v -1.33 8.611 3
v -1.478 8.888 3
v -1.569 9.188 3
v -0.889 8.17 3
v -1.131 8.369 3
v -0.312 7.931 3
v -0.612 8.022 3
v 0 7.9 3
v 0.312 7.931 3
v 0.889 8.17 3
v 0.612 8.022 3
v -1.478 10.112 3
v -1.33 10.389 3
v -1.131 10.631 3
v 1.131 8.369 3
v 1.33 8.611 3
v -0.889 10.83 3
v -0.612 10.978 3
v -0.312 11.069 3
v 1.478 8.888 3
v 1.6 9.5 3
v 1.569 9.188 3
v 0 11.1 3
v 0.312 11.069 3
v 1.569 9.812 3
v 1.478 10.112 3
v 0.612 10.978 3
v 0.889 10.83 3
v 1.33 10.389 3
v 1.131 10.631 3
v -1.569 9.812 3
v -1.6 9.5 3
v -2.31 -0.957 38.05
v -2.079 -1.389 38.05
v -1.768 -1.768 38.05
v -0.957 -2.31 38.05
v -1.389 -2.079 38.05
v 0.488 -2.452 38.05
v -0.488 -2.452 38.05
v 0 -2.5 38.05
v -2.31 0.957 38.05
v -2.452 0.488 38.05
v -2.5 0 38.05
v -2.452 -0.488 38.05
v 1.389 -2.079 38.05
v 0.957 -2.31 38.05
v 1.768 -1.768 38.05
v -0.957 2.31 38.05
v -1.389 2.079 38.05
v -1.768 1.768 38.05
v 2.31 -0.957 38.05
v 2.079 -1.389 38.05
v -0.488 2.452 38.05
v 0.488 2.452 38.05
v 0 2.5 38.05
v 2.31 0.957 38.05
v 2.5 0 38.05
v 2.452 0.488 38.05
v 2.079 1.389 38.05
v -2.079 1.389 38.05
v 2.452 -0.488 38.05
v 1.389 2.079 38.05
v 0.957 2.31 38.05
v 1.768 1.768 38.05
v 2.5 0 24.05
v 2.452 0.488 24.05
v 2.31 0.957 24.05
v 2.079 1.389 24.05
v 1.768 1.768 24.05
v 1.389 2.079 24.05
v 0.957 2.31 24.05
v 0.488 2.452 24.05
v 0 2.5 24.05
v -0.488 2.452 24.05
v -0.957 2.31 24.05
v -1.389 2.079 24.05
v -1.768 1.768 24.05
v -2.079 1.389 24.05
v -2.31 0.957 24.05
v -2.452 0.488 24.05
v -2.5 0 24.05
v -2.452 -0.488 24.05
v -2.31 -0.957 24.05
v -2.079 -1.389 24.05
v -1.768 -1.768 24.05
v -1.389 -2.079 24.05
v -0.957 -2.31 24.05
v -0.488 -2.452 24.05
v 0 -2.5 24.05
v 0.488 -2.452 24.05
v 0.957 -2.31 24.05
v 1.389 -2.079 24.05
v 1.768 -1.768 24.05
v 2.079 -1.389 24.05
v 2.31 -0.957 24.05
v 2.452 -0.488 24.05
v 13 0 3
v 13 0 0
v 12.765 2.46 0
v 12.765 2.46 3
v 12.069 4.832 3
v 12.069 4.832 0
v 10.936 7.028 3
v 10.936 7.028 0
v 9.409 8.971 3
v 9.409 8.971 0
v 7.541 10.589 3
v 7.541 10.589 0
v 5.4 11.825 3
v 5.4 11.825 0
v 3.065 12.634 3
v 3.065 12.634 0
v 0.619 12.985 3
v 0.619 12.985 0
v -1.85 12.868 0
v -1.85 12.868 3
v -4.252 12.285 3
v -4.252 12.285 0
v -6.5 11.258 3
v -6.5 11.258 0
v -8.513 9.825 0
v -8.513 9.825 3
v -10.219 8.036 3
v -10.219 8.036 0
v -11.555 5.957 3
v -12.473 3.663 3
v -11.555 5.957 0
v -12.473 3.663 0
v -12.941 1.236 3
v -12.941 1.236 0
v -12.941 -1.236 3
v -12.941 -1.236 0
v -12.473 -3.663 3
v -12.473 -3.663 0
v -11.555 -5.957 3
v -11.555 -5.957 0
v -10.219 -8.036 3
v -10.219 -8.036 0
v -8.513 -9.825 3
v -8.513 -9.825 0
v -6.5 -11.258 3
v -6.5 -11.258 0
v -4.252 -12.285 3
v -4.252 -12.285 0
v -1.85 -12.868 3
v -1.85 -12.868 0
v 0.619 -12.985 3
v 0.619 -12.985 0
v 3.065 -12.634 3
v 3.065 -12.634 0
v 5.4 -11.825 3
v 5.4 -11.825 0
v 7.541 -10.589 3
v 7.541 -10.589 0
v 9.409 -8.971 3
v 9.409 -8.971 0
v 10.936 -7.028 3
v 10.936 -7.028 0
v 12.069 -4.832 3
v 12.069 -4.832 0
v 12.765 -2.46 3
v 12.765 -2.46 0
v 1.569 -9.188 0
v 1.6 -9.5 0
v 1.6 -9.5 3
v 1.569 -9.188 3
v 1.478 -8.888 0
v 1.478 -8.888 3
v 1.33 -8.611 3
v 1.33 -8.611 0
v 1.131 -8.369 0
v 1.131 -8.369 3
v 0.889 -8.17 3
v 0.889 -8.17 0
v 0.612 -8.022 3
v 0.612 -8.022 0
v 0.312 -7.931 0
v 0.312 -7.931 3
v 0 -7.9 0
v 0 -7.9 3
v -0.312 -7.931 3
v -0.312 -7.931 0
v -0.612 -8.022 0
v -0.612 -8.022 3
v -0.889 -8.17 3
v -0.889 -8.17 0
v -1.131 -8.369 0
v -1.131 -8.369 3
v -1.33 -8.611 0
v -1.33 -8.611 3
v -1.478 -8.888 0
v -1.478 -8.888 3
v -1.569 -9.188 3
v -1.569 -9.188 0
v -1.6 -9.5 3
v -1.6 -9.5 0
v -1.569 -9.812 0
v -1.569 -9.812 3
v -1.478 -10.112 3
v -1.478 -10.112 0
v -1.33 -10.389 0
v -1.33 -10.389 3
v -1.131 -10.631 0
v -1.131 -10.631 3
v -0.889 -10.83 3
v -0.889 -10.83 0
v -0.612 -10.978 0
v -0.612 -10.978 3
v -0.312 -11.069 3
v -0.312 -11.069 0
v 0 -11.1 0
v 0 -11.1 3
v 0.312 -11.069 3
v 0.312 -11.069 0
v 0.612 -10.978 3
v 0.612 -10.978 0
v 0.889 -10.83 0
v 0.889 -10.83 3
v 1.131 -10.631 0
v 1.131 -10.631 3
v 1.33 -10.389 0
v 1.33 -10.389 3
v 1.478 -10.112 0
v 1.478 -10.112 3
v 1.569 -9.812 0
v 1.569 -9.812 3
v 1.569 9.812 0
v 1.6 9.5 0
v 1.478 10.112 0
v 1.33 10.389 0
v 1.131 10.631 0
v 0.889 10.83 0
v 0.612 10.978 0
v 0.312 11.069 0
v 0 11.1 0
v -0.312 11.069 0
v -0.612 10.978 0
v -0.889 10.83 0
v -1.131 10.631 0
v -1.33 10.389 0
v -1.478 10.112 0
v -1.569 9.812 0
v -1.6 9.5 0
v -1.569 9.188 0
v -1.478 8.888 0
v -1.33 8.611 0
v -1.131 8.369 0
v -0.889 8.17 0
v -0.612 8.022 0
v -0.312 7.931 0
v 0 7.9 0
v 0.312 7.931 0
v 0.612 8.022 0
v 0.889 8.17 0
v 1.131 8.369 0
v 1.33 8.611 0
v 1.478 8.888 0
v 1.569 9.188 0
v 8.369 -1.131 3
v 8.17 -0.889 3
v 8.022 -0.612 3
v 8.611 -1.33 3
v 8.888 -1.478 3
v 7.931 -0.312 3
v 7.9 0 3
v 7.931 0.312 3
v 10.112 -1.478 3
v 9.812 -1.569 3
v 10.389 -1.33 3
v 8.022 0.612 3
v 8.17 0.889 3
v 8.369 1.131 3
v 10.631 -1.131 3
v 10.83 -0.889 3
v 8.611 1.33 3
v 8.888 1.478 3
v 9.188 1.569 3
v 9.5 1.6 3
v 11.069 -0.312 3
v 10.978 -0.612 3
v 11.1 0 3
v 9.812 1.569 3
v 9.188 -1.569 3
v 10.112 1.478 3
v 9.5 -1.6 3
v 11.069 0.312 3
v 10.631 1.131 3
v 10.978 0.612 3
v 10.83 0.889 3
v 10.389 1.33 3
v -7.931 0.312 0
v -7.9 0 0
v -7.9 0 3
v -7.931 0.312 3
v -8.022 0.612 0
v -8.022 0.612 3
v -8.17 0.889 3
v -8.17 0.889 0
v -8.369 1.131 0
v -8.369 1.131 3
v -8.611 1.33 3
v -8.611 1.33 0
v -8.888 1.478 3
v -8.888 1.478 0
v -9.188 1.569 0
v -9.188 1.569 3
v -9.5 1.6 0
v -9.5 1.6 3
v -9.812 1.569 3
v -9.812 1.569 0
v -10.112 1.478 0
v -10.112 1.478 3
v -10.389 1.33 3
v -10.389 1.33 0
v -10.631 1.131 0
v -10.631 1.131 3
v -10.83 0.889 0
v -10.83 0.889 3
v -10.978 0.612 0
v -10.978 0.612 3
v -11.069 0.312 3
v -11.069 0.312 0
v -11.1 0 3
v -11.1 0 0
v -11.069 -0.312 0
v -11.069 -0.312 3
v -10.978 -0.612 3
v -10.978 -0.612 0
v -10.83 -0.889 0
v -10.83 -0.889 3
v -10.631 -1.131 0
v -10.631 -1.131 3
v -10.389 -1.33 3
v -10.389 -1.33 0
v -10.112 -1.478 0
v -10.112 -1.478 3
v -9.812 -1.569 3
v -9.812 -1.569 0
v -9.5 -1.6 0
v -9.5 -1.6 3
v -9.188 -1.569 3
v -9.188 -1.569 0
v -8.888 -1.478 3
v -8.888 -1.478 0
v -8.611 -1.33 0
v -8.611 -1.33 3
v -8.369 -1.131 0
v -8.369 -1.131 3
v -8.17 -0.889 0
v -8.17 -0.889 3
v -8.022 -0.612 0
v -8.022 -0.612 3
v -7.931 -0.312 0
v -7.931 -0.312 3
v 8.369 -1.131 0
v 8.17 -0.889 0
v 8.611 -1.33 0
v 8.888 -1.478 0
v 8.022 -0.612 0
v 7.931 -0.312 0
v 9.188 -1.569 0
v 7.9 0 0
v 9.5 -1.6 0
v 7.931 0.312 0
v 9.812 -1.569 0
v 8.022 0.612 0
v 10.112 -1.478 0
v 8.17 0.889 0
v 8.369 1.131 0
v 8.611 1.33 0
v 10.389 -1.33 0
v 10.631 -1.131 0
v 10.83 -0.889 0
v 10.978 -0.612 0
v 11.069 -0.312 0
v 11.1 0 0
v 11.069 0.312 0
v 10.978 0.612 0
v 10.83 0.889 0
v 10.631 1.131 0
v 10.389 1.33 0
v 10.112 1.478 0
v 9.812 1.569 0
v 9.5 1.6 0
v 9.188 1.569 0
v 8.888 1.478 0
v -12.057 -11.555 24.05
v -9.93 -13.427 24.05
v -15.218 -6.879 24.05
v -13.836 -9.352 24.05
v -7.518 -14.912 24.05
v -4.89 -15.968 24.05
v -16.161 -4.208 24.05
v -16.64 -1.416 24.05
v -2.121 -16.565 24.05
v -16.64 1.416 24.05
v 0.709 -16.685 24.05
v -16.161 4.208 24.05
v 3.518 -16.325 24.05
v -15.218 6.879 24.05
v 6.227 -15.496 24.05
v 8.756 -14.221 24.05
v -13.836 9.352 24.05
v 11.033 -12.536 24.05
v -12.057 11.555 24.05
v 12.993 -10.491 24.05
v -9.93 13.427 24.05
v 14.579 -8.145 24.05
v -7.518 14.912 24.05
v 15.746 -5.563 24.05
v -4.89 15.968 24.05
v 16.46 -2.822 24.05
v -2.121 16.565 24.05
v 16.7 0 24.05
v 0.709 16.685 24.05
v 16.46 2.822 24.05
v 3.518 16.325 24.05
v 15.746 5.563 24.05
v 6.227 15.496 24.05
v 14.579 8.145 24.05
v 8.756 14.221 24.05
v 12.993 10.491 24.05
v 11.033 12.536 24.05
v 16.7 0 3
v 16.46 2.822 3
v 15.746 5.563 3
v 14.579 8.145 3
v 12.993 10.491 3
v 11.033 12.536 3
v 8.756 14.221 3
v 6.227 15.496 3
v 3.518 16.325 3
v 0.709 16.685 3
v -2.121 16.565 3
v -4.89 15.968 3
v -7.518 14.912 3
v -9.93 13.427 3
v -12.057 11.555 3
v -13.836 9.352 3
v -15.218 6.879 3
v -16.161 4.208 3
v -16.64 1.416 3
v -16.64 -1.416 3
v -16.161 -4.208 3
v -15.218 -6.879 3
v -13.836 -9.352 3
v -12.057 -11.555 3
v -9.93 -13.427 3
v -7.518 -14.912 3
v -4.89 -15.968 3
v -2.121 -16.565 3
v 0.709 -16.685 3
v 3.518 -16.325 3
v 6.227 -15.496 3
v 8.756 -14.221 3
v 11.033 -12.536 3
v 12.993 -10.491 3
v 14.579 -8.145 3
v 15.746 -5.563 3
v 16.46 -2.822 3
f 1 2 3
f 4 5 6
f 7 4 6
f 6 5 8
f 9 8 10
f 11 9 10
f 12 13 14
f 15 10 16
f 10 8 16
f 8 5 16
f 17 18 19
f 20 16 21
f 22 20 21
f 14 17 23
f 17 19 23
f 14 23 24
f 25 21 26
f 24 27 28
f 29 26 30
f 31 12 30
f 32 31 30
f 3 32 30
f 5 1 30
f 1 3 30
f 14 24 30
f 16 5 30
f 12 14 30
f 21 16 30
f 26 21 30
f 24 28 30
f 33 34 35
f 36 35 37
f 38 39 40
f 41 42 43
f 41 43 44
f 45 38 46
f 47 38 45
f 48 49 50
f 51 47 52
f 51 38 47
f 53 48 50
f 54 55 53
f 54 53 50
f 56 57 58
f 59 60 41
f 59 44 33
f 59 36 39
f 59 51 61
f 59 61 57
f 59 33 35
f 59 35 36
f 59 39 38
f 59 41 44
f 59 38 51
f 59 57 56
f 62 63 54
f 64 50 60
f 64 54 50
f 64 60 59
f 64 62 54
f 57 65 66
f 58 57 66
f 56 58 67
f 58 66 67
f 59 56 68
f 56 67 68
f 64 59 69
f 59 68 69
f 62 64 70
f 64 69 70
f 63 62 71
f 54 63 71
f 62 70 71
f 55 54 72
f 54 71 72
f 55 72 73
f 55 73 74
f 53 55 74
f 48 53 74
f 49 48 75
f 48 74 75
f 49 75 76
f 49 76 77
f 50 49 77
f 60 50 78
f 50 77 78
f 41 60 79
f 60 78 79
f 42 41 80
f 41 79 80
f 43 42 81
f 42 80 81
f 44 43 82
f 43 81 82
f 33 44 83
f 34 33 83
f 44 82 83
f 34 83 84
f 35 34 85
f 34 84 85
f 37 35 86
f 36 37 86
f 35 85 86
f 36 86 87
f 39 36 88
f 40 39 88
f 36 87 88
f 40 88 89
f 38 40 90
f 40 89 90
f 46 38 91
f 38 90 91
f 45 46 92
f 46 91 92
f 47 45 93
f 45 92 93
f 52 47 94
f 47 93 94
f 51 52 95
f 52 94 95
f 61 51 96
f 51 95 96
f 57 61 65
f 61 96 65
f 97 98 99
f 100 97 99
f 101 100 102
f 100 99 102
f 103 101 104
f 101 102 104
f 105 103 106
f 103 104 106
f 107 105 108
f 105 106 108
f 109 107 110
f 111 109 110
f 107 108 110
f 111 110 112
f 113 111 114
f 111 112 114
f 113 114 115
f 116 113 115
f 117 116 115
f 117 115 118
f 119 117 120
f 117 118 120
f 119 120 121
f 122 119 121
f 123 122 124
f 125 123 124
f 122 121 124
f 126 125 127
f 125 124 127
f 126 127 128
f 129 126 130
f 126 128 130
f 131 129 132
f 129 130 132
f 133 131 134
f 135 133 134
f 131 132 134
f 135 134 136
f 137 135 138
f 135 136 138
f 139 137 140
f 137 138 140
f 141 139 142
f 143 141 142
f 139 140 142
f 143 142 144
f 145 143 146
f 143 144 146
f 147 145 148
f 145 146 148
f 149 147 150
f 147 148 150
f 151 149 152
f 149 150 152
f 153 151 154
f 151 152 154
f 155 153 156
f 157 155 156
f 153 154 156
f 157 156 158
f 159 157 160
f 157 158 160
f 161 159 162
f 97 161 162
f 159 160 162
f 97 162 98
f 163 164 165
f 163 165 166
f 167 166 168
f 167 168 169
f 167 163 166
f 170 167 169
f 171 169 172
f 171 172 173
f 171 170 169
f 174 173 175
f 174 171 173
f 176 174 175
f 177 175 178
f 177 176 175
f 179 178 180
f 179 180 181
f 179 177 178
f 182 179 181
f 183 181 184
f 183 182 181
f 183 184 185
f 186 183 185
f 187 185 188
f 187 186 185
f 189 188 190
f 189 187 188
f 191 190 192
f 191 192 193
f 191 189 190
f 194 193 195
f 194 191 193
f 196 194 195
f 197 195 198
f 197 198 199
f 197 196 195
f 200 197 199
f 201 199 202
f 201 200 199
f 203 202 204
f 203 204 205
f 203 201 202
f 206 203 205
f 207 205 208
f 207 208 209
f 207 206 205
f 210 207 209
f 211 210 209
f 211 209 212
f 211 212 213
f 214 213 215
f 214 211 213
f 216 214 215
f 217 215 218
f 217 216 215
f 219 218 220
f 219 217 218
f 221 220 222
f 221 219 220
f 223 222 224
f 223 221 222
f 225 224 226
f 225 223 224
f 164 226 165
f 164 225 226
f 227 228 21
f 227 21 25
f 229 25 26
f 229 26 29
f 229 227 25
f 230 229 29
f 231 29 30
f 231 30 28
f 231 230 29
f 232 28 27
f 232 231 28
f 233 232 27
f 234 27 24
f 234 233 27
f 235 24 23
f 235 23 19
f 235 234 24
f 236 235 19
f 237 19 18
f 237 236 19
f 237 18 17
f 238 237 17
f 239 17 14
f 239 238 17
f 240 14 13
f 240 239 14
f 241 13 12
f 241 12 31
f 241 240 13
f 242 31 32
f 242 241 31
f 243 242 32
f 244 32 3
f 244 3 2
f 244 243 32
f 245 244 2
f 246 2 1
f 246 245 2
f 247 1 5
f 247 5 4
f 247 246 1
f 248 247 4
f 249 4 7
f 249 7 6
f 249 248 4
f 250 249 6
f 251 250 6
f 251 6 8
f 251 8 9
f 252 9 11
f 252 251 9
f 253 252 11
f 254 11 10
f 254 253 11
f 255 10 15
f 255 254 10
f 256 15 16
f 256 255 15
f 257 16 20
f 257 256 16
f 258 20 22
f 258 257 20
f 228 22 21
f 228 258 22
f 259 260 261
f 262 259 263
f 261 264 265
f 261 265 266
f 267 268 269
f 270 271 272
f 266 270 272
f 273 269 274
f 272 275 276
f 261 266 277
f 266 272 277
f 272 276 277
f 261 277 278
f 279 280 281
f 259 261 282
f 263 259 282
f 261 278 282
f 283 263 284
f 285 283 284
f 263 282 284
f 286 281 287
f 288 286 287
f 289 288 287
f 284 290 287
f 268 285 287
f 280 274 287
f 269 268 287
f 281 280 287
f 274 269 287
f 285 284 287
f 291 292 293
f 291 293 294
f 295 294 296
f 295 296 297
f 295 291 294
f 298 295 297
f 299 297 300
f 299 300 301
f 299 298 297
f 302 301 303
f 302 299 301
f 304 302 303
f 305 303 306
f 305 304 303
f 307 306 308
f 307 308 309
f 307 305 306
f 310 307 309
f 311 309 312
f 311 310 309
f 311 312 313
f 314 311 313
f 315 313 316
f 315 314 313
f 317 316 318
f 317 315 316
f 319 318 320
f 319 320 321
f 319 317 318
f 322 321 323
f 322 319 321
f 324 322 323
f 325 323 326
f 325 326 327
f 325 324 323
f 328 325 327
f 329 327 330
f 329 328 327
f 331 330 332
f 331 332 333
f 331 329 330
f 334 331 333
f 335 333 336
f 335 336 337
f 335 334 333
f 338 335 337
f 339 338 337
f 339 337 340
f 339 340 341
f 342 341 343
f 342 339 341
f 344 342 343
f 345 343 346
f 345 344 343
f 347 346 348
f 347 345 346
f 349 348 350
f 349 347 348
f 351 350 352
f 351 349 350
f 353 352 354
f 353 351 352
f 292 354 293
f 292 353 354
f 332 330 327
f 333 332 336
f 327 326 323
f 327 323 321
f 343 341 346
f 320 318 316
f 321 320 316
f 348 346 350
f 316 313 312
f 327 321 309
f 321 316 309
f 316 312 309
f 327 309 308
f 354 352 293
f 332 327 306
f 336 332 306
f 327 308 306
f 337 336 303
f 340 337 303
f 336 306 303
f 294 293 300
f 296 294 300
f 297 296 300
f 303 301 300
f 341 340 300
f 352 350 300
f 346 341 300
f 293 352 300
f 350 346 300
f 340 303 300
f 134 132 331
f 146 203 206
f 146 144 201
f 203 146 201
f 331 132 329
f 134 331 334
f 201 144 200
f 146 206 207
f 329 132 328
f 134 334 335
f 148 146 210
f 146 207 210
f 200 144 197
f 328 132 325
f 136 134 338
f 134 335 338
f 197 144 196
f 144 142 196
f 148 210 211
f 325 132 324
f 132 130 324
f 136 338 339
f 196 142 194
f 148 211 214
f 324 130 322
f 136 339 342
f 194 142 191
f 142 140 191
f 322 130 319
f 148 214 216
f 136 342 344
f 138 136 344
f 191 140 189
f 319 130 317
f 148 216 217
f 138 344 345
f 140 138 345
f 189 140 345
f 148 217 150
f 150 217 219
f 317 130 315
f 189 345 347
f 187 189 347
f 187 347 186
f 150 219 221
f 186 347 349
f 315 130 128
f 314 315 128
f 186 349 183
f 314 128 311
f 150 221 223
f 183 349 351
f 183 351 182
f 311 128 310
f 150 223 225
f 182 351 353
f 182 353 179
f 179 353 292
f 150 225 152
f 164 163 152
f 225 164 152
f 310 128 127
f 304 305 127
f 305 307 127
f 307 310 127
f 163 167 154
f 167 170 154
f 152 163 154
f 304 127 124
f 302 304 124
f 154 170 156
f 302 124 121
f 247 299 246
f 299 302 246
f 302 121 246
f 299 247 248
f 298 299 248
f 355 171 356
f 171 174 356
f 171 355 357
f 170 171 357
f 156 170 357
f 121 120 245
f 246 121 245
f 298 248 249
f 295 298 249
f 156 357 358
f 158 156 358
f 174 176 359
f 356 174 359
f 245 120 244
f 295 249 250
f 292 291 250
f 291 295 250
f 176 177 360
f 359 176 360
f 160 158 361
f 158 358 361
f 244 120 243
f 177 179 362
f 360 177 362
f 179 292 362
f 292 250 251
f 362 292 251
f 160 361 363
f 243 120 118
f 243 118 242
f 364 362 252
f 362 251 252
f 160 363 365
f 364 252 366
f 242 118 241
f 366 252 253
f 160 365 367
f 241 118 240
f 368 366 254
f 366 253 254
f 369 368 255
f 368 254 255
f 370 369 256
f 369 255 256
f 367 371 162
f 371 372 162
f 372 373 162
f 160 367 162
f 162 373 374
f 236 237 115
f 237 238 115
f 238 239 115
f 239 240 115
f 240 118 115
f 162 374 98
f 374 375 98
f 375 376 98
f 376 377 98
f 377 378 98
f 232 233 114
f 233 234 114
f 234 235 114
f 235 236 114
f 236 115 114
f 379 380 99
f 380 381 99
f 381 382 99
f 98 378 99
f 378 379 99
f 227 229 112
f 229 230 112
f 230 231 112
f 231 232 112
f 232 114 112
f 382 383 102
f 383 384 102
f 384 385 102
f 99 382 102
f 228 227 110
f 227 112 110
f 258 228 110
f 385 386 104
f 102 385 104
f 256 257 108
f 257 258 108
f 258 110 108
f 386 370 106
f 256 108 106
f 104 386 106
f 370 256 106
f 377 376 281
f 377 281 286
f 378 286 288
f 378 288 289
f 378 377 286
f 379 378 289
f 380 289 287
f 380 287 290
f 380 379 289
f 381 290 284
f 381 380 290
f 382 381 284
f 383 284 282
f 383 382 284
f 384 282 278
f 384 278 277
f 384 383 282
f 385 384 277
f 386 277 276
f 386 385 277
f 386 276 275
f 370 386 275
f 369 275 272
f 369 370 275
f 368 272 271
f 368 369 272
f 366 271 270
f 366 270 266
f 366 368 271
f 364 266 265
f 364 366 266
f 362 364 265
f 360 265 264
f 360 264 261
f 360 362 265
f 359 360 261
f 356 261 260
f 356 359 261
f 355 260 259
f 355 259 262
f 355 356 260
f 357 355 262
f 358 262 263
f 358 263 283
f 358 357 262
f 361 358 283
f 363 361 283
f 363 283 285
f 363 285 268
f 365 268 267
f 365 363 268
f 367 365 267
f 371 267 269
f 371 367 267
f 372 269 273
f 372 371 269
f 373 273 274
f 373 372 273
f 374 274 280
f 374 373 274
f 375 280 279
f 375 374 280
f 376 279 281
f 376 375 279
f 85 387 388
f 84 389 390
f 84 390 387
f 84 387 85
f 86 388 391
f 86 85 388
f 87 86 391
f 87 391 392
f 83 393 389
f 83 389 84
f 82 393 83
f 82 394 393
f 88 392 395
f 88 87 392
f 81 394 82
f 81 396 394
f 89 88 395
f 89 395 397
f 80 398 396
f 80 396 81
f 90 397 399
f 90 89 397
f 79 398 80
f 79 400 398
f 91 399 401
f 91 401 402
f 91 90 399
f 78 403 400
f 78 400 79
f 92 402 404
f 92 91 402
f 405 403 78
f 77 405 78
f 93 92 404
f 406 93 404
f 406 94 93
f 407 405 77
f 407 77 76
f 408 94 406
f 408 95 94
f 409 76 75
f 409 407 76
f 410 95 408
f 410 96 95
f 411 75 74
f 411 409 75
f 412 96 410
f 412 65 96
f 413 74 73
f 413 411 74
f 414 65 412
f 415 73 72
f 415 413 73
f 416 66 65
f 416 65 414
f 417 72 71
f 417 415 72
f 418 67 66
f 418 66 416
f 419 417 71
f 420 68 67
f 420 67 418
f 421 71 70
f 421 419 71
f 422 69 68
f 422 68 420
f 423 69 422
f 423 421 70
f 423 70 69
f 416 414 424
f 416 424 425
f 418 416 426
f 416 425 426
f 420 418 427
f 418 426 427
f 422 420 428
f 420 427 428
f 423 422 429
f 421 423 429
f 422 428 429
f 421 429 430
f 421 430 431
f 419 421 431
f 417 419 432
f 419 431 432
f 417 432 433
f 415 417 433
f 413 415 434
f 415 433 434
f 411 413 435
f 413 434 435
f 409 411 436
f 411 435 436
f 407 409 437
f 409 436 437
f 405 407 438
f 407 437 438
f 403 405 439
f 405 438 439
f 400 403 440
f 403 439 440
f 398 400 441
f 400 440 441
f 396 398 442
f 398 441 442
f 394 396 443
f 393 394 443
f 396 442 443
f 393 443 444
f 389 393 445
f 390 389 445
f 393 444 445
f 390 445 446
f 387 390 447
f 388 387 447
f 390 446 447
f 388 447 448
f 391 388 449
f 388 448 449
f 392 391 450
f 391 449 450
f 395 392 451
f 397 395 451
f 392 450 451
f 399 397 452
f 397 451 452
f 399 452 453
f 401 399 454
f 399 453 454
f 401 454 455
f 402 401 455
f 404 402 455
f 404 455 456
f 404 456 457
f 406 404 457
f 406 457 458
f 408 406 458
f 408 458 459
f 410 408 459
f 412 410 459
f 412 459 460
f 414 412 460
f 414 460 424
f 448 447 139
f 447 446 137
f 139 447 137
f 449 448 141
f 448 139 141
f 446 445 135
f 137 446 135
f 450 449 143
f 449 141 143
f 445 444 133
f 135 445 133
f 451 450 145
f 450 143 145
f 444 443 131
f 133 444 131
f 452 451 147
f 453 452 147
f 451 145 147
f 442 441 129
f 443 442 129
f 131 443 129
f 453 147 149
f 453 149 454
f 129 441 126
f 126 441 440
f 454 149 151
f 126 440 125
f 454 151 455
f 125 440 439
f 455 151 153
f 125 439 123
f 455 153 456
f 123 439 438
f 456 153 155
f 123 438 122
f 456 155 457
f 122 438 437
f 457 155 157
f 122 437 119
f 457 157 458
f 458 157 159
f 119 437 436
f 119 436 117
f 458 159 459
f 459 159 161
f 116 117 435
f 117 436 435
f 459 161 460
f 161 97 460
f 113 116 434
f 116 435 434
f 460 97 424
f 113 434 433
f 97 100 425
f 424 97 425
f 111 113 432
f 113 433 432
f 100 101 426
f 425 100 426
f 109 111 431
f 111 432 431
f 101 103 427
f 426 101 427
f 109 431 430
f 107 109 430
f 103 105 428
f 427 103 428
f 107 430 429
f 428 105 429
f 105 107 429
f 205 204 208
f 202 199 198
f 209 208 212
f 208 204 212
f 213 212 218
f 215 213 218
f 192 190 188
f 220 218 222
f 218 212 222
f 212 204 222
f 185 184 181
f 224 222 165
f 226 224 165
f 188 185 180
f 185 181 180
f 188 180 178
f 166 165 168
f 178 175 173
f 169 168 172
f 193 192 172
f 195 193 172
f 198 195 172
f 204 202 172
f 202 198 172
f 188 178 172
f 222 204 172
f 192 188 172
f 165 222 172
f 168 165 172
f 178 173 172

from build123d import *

# Parameters (mm, degrees)
SKETCH_1_R        = 13
SKETCH_1_R_2      = 1.6
EXTRUDE_228_DEPTH = 3
EXTRUDE_START     = 3
SKETCH_2_R        = 16.7
EXTRUDE_287_DEPTH = 21.05
M5_14MM_START     = 24.05
SKETCH_3_R        = 2.5
M5_14MM_DEPTH     = 14


with BuildPart() as part:
    # 草图1 → Extrude 228 (new body)
    with BuildSketch(Plane.XY):
        Circle(SKETCH_1_R)
        with Locations((-9.5, 0)):
            Circle(SKETCH_1_R_2, mode=Mode.SUBTRACT)
        with Locations((0, -9.5)):
            Circle(SKETCH_1_R_2, mode=Mode.SUBTRACT)
        with Locations((9.5, 0)):
            Circle(SKETCH_1_R_2, mode=Mode.SUBTRACT)
        with Locations((0, 9.5)):
            Circle(SKETCH_1_R_2, mode=Mode.SUBTRACT)
    extrude(amount=EXTRUDE_228_DEPTH)

    # 草图2 → Extrude 287 (add)
    with BuildSketch(Plane.XY.offset(EXTRUDE_START)):
        Circle(SKETCH_2_R)
    extrude(amount=EXTRUDE_287_DEPTH)

    # 草图3 → M5桨轴_外伸14mm (add)
    with BuildSketch(Plane.XY.offset(M5_14MM_START)):
        Circle(SKETCH_3_R)
    extrude(amount=M5_14MM_DEPTH)


solid = part.part
